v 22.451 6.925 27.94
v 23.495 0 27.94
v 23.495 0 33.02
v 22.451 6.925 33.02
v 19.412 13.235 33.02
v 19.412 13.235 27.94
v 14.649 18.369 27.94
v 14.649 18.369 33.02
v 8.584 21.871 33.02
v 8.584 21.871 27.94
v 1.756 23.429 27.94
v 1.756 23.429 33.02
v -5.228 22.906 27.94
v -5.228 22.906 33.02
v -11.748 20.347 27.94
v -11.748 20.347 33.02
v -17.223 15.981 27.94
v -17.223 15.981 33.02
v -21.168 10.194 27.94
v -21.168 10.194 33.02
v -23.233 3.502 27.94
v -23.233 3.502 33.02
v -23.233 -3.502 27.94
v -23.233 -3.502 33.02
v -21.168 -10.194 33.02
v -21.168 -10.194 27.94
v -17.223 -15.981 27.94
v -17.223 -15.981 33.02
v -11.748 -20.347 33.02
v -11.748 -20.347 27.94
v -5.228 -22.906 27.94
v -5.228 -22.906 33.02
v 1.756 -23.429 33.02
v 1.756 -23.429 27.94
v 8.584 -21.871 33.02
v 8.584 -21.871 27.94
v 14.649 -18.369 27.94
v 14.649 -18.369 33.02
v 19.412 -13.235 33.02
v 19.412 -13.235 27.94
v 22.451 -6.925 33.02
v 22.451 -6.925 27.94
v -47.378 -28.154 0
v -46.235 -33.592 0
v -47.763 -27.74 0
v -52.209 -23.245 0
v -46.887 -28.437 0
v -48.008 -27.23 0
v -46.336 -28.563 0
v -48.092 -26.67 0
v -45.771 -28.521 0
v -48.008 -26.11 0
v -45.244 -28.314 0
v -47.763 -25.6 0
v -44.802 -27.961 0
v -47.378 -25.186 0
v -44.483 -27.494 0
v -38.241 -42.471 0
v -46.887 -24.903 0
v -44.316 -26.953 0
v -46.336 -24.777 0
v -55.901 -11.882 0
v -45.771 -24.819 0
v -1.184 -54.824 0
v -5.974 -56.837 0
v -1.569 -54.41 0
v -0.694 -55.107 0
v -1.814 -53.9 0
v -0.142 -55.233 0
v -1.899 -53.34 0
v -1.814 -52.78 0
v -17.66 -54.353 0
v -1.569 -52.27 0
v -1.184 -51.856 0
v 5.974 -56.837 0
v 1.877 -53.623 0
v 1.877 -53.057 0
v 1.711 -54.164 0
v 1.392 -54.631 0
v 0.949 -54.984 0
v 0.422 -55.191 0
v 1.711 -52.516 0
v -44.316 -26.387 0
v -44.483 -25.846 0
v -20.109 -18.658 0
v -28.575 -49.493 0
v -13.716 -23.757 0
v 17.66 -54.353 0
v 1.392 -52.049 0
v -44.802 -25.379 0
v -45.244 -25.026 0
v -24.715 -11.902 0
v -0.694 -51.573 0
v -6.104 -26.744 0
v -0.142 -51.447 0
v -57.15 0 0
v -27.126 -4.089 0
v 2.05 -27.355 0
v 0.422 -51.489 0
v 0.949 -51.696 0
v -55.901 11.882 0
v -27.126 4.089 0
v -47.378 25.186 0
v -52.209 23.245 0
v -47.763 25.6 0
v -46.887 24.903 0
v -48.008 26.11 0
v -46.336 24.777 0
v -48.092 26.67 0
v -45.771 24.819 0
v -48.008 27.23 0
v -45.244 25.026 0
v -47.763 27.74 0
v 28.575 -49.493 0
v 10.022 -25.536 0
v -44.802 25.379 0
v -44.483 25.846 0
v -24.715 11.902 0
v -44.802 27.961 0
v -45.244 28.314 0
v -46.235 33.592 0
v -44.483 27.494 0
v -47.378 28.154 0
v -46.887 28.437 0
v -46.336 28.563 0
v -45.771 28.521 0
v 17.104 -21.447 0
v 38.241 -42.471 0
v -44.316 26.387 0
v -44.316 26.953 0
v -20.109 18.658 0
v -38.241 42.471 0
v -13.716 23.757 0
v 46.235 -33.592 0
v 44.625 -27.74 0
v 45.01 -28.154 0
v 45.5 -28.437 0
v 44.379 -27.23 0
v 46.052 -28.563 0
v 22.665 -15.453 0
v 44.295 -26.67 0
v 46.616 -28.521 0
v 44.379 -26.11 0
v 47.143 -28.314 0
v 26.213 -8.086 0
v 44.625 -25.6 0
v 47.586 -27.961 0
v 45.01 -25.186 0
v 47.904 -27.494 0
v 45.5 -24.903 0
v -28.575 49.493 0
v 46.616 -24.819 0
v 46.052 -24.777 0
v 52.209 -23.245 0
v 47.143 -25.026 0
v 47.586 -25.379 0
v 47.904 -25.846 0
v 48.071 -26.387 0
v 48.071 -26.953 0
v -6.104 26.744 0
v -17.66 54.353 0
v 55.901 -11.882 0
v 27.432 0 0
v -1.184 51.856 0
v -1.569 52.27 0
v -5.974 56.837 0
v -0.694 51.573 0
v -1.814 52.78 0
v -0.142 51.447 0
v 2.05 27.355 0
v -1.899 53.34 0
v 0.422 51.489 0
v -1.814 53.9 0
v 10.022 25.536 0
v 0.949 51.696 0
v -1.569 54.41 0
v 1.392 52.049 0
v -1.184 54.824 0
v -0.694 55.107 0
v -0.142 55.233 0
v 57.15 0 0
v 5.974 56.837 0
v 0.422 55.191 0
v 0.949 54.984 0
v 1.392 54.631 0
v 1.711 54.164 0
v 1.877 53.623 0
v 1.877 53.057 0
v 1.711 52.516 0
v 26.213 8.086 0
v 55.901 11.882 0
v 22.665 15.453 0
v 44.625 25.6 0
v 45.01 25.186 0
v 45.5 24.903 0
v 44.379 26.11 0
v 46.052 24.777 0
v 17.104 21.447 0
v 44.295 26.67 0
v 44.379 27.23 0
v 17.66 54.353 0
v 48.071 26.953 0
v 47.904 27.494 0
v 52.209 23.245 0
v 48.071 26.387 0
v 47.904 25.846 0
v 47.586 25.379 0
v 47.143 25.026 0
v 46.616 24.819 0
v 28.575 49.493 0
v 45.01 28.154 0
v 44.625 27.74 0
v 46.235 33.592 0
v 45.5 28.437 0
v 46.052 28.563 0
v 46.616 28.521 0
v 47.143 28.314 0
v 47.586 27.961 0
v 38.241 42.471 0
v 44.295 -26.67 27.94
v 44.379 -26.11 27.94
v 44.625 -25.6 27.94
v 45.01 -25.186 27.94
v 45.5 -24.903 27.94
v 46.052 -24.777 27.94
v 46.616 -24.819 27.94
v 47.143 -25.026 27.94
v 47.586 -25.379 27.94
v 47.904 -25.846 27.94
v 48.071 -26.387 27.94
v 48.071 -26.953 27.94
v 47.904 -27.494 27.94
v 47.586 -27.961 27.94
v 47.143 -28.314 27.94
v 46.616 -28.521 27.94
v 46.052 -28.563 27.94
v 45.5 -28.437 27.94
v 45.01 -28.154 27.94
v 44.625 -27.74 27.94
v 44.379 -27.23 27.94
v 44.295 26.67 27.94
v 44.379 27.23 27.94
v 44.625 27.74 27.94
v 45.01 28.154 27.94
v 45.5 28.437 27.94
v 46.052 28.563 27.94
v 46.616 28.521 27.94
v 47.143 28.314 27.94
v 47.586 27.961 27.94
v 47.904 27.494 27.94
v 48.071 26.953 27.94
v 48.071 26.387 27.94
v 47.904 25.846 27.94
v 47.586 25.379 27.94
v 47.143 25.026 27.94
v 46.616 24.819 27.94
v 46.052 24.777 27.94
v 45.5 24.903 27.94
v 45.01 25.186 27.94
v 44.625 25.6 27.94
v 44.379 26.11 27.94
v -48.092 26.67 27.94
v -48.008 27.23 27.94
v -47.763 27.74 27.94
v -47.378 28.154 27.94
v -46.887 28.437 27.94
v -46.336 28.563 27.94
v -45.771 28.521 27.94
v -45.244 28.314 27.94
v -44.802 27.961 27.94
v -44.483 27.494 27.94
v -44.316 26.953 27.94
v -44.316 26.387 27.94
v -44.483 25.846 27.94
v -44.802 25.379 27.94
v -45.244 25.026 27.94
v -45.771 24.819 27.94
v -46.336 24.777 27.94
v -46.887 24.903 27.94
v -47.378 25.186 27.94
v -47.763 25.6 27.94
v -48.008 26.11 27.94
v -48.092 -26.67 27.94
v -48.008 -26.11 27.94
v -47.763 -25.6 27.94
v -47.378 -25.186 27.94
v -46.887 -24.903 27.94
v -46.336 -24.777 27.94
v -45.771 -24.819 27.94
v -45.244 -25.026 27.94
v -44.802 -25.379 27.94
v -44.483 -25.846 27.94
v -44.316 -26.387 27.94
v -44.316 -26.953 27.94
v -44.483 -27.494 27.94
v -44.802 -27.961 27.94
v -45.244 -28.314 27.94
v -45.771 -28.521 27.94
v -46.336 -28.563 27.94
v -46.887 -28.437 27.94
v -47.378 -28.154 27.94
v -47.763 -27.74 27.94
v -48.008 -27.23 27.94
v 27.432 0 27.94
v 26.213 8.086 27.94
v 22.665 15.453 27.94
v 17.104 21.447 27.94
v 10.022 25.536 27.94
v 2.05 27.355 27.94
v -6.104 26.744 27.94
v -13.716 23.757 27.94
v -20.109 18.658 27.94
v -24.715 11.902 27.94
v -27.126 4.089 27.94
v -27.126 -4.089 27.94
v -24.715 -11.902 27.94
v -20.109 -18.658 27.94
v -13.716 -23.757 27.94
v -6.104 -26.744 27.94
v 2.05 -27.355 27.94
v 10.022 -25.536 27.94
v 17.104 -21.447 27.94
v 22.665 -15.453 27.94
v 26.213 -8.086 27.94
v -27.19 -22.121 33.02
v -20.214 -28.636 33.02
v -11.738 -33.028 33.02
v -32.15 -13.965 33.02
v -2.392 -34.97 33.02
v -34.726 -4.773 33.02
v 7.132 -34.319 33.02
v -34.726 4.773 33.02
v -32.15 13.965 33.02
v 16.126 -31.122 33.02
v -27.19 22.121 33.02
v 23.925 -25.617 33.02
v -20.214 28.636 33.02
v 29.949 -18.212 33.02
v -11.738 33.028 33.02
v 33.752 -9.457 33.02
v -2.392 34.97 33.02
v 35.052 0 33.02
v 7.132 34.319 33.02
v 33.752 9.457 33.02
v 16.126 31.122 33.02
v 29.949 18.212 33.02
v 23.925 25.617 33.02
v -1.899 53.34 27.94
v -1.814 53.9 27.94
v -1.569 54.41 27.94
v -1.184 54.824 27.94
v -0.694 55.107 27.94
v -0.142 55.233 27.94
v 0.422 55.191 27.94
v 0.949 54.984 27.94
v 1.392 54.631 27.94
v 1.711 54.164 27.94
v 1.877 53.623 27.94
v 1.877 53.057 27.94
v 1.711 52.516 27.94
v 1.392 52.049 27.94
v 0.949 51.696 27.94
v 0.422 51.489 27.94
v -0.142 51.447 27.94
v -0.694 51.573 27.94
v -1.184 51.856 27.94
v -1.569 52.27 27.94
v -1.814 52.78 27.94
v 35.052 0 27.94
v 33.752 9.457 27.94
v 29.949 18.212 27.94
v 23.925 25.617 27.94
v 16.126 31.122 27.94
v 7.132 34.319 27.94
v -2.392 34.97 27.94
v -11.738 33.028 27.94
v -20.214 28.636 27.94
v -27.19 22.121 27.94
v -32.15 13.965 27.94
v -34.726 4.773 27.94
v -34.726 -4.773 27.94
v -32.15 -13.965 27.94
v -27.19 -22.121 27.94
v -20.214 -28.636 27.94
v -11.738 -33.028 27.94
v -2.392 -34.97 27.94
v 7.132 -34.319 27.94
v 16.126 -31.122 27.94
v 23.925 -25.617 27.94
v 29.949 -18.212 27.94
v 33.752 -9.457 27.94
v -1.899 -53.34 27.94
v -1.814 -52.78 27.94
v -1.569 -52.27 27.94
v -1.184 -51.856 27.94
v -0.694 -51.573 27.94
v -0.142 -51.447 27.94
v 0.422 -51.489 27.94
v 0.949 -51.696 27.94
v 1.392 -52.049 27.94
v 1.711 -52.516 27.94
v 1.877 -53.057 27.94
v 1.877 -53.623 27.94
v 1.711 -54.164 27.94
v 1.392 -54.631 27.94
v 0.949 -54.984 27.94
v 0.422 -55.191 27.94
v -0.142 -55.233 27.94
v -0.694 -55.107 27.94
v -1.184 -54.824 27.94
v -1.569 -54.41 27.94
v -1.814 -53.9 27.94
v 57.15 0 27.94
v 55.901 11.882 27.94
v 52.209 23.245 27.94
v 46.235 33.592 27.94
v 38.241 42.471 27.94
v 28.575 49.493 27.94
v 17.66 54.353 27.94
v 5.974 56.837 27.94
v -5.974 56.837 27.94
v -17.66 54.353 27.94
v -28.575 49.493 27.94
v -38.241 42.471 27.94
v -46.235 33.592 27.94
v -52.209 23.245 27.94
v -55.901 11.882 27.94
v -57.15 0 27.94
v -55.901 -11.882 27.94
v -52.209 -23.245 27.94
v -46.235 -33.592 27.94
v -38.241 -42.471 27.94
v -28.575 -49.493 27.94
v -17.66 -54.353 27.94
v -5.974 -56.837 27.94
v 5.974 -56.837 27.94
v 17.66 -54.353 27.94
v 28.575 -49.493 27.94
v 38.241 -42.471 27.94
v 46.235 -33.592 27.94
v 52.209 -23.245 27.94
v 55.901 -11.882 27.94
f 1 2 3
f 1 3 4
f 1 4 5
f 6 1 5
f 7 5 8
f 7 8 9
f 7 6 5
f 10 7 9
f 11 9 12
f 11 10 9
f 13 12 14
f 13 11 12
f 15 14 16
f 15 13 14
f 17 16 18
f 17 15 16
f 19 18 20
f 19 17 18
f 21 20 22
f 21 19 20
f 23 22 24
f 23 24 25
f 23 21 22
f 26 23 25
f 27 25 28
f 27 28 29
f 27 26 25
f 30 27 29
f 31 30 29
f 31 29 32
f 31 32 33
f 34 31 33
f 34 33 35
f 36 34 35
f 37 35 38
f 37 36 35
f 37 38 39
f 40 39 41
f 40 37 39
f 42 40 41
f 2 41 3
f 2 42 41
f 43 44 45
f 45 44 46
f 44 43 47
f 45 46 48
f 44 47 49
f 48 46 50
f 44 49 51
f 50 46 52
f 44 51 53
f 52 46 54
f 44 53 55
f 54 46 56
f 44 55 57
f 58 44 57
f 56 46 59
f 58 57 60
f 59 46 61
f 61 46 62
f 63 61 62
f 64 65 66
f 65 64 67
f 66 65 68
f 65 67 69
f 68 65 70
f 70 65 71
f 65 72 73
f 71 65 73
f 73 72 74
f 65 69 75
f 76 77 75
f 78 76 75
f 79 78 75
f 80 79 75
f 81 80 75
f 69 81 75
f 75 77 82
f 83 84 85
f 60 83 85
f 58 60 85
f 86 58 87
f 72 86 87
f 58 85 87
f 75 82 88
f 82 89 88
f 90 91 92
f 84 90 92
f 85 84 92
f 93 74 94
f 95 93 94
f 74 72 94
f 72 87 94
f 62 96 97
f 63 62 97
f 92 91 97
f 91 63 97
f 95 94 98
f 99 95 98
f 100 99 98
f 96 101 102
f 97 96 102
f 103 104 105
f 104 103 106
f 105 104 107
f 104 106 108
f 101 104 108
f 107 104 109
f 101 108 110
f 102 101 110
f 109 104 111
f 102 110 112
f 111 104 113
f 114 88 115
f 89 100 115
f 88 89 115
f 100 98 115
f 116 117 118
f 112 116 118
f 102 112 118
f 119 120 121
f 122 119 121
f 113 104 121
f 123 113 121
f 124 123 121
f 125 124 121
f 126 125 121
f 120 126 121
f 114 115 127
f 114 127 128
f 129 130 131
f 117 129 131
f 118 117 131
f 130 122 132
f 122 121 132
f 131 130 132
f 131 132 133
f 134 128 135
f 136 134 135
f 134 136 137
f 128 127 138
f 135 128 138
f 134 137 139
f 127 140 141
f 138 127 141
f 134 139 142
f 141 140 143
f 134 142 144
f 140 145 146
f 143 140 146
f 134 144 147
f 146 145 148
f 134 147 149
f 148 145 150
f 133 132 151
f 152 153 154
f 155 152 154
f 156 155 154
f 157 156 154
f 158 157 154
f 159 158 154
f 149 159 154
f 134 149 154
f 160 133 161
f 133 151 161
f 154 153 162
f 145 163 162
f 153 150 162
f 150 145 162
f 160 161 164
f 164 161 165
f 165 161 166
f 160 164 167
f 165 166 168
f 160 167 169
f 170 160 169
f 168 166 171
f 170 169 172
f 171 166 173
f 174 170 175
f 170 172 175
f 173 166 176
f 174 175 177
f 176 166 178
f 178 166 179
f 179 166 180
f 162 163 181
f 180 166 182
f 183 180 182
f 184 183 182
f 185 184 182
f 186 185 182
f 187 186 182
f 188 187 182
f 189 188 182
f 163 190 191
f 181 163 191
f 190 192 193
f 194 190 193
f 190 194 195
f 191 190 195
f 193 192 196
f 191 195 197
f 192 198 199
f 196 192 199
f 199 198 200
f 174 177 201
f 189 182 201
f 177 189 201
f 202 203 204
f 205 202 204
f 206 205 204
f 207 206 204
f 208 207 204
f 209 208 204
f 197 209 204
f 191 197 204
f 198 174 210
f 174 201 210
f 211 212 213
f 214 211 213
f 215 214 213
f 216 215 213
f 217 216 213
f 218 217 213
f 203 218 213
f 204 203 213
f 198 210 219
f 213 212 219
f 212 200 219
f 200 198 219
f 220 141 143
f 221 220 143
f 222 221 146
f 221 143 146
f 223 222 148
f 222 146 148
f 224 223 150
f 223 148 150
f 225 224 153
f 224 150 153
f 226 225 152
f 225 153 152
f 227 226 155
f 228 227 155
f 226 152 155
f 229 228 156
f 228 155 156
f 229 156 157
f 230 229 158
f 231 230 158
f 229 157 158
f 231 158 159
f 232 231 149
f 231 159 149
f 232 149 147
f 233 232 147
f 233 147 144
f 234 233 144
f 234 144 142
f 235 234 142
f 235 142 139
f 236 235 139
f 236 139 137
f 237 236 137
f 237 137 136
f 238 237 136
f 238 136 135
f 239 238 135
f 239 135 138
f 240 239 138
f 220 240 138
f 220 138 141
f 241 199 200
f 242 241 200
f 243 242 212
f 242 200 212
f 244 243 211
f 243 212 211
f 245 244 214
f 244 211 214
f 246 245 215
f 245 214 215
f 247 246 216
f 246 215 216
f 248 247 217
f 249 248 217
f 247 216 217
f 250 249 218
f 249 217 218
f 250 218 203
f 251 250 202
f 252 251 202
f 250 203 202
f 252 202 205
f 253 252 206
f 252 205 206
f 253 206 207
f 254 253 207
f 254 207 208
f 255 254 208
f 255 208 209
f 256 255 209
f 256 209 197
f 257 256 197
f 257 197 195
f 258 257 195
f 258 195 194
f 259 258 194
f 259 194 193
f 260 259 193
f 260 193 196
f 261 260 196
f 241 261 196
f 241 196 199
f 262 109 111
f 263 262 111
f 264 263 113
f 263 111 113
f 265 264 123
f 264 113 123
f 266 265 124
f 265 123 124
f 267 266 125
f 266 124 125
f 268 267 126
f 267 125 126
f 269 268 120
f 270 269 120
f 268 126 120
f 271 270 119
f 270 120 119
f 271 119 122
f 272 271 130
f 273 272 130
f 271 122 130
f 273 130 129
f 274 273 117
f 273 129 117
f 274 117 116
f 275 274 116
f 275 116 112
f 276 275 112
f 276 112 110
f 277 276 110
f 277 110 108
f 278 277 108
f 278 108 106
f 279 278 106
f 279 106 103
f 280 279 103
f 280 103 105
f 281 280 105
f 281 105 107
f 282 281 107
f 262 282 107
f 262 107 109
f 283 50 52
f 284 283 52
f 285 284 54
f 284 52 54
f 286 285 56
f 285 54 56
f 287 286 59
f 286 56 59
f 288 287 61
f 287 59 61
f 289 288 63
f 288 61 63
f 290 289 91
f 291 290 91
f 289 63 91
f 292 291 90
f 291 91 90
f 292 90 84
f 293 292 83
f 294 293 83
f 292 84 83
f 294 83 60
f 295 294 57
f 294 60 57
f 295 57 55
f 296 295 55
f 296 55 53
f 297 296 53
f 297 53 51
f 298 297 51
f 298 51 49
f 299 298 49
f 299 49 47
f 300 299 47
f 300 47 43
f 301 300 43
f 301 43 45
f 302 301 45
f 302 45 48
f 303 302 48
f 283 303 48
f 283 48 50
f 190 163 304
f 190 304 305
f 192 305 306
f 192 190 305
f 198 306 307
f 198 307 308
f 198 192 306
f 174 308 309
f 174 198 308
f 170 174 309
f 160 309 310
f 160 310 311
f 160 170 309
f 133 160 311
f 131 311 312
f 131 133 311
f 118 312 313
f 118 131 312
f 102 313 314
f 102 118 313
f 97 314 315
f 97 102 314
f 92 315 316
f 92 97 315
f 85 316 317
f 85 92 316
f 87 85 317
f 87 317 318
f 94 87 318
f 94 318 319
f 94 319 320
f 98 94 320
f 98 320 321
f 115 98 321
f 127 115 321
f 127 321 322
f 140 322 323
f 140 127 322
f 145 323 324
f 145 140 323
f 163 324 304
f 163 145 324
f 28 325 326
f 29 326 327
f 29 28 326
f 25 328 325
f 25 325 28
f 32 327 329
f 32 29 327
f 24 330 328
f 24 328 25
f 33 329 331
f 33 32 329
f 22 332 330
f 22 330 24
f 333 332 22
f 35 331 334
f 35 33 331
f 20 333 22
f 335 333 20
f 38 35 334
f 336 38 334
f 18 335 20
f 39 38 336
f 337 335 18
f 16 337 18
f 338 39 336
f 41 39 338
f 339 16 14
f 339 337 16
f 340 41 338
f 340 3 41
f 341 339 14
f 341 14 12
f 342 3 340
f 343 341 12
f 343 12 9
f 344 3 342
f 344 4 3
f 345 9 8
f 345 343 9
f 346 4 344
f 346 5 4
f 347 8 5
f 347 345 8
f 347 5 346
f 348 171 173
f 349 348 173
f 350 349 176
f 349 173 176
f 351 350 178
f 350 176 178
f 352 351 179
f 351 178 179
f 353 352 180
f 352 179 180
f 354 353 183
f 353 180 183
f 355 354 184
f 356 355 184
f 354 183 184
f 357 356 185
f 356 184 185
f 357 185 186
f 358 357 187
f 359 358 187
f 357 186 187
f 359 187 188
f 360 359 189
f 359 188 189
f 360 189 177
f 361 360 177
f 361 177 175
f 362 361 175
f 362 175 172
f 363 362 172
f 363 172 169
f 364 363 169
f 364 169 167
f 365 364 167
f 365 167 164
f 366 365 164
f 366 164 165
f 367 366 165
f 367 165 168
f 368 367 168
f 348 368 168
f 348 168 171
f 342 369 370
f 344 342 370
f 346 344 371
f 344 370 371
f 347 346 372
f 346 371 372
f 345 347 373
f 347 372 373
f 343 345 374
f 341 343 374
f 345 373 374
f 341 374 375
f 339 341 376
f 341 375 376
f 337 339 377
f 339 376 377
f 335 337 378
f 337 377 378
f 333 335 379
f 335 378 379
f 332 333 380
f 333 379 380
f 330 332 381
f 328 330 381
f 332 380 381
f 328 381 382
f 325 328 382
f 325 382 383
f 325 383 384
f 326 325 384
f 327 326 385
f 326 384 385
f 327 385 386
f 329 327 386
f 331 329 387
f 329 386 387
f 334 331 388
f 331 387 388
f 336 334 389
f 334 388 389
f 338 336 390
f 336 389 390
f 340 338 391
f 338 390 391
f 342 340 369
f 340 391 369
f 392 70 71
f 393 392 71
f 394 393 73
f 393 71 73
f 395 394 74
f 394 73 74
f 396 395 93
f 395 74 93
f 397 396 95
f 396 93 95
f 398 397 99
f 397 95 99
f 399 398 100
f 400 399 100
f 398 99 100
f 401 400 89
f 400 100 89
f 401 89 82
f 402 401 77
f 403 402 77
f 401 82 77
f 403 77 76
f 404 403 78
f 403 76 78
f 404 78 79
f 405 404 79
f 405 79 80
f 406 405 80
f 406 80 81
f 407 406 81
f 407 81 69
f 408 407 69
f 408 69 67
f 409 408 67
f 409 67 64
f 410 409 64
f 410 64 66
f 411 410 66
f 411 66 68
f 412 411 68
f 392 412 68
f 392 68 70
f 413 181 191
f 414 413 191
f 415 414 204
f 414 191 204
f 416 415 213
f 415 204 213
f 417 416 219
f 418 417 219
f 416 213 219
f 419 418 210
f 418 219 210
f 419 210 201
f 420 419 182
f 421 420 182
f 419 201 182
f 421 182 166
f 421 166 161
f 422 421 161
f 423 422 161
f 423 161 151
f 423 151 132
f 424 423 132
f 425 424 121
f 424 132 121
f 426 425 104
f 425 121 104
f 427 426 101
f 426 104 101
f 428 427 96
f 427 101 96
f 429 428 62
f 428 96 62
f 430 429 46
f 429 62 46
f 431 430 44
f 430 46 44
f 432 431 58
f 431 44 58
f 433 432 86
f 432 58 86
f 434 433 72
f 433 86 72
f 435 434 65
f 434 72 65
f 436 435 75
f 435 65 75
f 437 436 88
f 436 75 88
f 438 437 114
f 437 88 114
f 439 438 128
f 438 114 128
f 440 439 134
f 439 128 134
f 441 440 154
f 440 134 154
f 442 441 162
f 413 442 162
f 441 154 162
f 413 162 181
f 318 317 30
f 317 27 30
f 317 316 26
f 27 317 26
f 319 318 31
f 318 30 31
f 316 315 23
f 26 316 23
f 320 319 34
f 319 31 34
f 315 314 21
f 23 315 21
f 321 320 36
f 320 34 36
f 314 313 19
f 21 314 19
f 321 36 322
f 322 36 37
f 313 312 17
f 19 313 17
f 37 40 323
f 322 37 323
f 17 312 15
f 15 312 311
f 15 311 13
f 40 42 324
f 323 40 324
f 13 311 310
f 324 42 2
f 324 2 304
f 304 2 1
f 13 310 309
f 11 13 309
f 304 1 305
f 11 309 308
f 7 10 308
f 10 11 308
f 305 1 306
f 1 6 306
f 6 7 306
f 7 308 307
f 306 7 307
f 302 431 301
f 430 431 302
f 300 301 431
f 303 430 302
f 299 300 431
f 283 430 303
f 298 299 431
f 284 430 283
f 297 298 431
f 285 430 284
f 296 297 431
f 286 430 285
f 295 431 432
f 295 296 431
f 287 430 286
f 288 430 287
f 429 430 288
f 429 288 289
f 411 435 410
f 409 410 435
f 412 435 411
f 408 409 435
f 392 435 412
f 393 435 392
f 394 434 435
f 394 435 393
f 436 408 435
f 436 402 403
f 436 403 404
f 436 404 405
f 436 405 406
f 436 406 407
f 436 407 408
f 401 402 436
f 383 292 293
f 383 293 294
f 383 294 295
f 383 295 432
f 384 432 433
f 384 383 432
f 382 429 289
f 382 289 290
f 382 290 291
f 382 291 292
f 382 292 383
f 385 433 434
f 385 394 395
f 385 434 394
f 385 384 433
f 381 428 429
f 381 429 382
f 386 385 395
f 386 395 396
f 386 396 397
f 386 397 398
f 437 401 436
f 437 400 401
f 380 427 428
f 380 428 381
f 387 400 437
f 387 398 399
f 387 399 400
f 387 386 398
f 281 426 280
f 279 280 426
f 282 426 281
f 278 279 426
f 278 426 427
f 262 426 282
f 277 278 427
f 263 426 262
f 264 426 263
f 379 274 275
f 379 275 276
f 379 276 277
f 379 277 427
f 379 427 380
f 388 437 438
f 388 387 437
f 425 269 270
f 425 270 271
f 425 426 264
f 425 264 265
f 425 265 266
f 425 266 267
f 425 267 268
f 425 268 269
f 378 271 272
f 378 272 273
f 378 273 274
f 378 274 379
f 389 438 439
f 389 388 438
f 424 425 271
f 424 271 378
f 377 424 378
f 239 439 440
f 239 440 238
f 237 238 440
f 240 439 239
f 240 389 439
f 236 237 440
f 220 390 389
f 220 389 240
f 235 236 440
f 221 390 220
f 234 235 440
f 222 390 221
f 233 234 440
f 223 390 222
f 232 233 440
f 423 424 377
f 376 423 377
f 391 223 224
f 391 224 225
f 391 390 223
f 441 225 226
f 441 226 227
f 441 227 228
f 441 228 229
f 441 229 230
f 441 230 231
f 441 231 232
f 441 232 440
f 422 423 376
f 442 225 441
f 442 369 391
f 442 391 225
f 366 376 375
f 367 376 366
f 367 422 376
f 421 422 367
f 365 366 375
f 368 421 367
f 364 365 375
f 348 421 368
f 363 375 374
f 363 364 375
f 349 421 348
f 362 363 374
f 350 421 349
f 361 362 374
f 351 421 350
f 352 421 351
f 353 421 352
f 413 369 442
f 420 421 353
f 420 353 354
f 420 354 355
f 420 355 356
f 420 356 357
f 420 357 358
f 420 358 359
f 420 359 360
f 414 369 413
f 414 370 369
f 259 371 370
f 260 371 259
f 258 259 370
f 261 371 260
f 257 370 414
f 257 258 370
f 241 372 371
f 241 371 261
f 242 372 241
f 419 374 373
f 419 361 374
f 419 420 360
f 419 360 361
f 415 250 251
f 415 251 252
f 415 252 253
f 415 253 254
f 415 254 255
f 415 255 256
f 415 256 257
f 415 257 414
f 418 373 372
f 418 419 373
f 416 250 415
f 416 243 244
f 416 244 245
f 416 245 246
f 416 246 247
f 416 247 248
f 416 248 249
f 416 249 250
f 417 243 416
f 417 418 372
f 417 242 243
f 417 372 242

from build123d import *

# Parameters (mm, degrees)
F0_R     = 57.15
F0_R_2   = 27.432
F1_DEPTH = 27.94
F2_R     = 35.052
F2_R_2   = 23.495
F3_DEPTH = 5.08
F5_D     = 3.7973


with BuildPart() as f1:
    # F0 (on Top) → F1 (new body)
    with BuildSketch(Plane.XY):
        Circle(F0_R)
        Circle(F0_R_2, mode=Mode.SUBTRACT)
    extrude(amount=F1_DEPTH)

    # F2 (on face) → F3 (join)
    with BuildSketch(Plane.XY.offset(27.94)):
        Circle(F2_R)
        Circle(F2_R_2, mode=Mode.SUBTRACT)
    extrude(amount=F3_DEPTH)

    # F5 (through all)
    with Locations(Plane.XY.offset(27.94)):
        with Locations((0, -53.34), (46.1937950379, -26.67), (46.1937950379, 26.67), (0, 53.34), (-46.1937950379, 26.67), (-46.1937950379, -26.67)):
            Hole(F5_D / 2)


solid = f1.part
